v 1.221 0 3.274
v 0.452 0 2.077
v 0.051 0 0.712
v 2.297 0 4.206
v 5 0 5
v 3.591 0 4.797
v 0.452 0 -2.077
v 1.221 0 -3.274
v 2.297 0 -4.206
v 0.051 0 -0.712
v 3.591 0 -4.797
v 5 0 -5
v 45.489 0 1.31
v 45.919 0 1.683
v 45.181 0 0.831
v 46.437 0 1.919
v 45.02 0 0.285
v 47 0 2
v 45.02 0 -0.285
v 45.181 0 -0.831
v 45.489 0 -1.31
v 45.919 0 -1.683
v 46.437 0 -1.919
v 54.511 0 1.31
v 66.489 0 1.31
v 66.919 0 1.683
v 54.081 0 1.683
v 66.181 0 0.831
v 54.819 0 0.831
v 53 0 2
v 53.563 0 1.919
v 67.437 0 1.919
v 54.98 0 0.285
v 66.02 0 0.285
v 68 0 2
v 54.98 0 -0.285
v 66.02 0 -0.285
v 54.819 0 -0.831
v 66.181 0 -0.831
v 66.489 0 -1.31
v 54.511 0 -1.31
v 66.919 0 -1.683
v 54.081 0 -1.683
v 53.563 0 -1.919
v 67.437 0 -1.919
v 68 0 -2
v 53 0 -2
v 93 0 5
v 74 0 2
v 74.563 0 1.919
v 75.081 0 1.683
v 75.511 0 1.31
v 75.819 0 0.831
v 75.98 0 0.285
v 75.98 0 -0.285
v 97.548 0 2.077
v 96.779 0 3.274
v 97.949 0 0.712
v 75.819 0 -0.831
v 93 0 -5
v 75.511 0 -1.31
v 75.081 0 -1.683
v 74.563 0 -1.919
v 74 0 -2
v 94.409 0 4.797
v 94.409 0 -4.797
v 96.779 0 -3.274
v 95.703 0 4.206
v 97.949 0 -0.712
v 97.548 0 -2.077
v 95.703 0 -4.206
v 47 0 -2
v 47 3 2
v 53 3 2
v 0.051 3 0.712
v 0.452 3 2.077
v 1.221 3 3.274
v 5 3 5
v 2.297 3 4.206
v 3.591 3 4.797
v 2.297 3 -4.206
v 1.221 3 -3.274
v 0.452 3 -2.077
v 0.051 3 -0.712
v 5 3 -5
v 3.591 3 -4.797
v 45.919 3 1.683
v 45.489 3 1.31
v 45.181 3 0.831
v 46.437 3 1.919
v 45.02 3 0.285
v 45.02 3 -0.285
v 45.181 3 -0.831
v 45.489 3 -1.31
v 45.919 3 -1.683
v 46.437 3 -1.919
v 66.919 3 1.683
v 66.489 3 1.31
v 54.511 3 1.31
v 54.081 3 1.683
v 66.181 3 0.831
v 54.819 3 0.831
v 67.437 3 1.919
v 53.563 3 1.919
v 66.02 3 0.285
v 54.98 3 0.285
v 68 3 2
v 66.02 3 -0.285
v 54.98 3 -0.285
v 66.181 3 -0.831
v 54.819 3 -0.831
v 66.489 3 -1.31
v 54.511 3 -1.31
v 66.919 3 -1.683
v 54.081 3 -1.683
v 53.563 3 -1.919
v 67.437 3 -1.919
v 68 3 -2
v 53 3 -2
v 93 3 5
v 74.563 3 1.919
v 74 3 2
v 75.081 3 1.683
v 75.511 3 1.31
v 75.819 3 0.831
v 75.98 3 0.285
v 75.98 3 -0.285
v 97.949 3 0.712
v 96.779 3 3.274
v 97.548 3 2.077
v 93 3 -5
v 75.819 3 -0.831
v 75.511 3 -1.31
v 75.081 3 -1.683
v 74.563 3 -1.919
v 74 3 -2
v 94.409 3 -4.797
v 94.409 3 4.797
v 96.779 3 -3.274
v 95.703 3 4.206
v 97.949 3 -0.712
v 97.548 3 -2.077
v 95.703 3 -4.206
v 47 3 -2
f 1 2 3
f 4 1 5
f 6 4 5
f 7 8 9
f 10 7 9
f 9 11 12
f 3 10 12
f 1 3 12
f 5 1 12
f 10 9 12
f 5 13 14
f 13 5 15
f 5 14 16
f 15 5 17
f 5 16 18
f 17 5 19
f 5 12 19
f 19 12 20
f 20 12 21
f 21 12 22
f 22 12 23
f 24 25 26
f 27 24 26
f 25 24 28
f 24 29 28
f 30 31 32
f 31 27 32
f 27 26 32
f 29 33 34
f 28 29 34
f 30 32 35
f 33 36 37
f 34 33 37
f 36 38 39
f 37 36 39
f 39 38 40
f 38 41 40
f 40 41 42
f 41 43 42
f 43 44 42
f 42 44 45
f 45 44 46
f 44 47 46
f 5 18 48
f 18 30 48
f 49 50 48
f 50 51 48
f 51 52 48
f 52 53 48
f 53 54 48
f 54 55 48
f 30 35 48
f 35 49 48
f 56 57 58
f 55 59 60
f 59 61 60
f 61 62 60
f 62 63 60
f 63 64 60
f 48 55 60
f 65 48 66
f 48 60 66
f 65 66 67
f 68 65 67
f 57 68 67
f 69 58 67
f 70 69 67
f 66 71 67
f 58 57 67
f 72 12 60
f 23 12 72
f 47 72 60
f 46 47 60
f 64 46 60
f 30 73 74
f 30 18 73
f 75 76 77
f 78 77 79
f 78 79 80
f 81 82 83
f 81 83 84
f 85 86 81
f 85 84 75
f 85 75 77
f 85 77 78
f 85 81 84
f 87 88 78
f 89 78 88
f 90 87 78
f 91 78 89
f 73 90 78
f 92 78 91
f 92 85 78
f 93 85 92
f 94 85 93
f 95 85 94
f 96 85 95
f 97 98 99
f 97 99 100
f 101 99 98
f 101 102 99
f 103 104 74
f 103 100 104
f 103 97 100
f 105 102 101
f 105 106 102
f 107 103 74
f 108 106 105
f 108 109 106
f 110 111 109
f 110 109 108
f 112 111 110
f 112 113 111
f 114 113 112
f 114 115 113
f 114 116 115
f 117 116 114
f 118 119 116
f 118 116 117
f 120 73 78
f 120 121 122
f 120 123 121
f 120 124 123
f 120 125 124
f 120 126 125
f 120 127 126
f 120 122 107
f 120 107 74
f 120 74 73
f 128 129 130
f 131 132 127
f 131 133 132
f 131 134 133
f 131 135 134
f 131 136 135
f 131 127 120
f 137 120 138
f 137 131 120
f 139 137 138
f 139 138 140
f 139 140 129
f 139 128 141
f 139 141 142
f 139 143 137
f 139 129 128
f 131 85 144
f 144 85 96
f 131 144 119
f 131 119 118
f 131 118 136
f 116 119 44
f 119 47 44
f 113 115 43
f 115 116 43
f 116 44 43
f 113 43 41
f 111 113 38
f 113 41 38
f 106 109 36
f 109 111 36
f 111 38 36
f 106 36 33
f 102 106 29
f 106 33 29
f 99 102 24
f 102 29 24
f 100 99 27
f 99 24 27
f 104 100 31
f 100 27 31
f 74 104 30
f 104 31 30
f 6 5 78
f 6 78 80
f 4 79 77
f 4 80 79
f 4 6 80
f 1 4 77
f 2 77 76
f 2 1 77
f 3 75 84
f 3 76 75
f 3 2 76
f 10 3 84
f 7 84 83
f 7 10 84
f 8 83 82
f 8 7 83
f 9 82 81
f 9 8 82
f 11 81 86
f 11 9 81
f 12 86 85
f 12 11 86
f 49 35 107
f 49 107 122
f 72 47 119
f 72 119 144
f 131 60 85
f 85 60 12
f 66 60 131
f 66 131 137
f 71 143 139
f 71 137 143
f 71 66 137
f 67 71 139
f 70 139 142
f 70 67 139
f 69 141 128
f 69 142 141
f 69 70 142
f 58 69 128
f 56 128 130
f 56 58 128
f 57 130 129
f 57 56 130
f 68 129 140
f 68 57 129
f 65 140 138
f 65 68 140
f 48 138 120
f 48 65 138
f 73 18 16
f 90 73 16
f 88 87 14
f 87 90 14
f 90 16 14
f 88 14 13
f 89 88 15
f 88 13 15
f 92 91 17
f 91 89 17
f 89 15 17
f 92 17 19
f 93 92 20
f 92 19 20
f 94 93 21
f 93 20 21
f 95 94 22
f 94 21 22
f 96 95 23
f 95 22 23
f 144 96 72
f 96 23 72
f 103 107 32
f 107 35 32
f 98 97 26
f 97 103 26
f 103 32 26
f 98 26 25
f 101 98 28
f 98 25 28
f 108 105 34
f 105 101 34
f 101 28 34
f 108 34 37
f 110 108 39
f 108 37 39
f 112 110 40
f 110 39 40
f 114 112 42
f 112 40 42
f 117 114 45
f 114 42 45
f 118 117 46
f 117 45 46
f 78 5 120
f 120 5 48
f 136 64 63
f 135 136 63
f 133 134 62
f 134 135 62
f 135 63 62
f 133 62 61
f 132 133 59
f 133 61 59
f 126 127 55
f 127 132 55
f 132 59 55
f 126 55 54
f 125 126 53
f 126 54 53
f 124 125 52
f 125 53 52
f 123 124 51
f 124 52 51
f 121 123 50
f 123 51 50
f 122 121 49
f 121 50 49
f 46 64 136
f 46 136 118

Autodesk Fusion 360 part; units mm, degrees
sketch "Sketch1" plane through (0, 0, 0) normal (0, 1, 0) x (1, 0, 0)
  line L0 (5, -5) -> (93, -5)
  arc A0 (93, -5) -> (93, 5) centre (93, 0) ccw
  line L1 (93, 5) -> (5, 5)
  arc A1 (5, 5) -> (5, -5) centre (5, 0) ccw
  line L2 (49, 5) -> (49, -5) construction
  line L3 (50, 0) -> (71, 0) construction
  line L4 (53, 2) -> (47, 2)
  arc A2 (47, 2) -> (47, -2) centre (47, 0) ccw
  line L5 (47, -2) -> (53, -2)
  arc A3 (53, -2) -> (53, 2) centre (53, 0) ccw
  line L6 (53, 0) -> (47, 0) construction
  line L7 (68, -2) -> (74, -2)
  arc A4 (74, -2) -> (74, 2) centre (74, 0) ccw
  line L8 (74, 2) -> (68, 2)
  arc A5 (68, 2) -> (68, -2) centre (68, 0) ccw
  line L9 (68, 0) -> (74, 0) construction
  point P0 (98, 0)
  point P1 (50, 0)
  point P2 (71, 0)
  point P3 (49, 0)
  dimension "d1" = 10
  dimension "d3" = 98
  dimension "d4" = 4
  dimension "d5" = 6
  dimension "d6" = 6
  dimension "d7" = 21
  dimension "d8" = 1
extrude "Extrude1" add sketch "Sketch1" along normal blind 3
